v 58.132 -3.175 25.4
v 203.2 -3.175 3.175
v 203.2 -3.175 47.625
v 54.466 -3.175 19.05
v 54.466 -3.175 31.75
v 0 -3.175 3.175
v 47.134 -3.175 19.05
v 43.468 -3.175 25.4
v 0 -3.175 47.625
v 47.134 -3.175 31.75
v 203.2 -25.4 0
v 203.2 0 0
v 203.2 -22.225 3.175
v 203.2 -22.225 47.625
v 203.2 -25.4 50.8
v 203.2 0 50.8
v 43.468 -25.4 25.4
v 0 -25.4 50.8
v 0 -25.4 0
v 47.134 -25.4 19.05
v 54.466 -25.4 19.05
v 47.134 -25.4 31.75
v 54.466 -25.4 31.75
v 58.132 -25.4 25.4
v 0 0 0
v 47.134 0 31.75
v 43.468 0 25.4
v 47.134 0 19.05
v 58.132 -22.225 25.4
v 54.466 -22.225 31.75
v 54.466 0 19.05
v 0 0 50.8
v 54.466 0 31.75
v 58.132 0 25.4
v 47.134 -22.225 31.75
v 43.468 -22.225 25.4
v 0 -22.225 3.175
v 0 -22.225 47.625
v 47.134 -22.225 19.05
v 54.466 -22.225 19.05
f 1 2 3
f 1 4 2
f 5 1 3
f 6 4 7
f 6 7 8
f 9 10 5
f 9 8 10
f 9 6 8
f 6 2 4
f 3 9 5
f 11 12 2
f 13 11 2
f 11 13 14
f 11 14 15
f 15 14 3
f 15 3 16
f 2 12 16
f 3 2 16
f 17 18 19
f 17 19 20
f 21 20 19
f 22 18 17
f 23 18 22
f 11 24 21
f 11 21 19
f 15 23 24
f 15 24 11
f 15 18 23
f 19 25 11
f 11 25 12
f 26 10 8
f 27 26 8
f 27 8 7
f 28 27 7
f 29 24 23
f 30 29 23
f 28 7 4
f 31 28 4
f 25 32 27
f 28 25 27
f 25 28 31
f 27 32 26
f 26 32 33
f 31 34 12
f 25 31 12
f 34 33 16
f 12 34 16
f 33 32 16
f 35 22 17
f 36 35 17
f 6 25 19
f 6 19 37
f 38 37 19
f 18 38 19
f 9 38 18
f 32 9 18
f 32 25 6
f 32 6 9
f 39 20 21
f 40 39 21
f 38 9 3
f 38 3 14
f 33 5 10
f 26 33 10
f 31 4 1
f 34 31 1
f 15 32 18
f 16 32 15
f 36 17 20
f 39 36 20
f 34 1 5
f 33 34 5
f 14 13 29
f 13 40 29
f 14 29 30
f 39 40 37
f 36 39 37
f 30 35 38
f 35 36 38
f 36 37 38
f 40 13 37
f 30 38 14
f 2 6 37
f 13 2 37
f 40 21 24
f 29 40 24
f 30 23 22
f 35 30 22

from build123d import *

# Parameters (mm, degrees)
F0_W     = 203.2
F0_H     = 50.8
F1_DEPTH = 25.4
F2_W     = 19.05
F2_H     = 44.45
F3_DEPTH = 304.8
F5_DEPTH = 25.4


with BuildPart() as f1:
    # F0 (on Front) → F1 (new body)
    with BuildSketch(Plane.XZ):
        with Locations((101.6, 25.4)):
            Rectangle(F0_W, F0_H)
    extrude(amount=F1_DEPTH)

    # F2 (on face) → F3 (cut)
    with BuildSketch(Plane(origin=(0, 0, 0), x_dir=(0, -1, 0), z_dir=(-1, 0, 0))):
        with Locations((12.7, 25.4)):
            Rectangle(F2_W, F2_H)
    extrude(amount=-F3_DEPTH, mode=Mode.SUBTRACT)

    # F4 (on face) → F5 (cut)
    with BuildSketch(Plane.XZ.offset(25.4)):
        Polygon((54.466174, 31.75), (47.133826, 31.75), (43.467652, 25.4), (47.133826, 19.05), (54.466174, 19.05), (58.132348, 25.4), align=None)
    extrude(amount=-F5_DEPTH, mode=Mode.SUBTRACT)


solid = f1.part
